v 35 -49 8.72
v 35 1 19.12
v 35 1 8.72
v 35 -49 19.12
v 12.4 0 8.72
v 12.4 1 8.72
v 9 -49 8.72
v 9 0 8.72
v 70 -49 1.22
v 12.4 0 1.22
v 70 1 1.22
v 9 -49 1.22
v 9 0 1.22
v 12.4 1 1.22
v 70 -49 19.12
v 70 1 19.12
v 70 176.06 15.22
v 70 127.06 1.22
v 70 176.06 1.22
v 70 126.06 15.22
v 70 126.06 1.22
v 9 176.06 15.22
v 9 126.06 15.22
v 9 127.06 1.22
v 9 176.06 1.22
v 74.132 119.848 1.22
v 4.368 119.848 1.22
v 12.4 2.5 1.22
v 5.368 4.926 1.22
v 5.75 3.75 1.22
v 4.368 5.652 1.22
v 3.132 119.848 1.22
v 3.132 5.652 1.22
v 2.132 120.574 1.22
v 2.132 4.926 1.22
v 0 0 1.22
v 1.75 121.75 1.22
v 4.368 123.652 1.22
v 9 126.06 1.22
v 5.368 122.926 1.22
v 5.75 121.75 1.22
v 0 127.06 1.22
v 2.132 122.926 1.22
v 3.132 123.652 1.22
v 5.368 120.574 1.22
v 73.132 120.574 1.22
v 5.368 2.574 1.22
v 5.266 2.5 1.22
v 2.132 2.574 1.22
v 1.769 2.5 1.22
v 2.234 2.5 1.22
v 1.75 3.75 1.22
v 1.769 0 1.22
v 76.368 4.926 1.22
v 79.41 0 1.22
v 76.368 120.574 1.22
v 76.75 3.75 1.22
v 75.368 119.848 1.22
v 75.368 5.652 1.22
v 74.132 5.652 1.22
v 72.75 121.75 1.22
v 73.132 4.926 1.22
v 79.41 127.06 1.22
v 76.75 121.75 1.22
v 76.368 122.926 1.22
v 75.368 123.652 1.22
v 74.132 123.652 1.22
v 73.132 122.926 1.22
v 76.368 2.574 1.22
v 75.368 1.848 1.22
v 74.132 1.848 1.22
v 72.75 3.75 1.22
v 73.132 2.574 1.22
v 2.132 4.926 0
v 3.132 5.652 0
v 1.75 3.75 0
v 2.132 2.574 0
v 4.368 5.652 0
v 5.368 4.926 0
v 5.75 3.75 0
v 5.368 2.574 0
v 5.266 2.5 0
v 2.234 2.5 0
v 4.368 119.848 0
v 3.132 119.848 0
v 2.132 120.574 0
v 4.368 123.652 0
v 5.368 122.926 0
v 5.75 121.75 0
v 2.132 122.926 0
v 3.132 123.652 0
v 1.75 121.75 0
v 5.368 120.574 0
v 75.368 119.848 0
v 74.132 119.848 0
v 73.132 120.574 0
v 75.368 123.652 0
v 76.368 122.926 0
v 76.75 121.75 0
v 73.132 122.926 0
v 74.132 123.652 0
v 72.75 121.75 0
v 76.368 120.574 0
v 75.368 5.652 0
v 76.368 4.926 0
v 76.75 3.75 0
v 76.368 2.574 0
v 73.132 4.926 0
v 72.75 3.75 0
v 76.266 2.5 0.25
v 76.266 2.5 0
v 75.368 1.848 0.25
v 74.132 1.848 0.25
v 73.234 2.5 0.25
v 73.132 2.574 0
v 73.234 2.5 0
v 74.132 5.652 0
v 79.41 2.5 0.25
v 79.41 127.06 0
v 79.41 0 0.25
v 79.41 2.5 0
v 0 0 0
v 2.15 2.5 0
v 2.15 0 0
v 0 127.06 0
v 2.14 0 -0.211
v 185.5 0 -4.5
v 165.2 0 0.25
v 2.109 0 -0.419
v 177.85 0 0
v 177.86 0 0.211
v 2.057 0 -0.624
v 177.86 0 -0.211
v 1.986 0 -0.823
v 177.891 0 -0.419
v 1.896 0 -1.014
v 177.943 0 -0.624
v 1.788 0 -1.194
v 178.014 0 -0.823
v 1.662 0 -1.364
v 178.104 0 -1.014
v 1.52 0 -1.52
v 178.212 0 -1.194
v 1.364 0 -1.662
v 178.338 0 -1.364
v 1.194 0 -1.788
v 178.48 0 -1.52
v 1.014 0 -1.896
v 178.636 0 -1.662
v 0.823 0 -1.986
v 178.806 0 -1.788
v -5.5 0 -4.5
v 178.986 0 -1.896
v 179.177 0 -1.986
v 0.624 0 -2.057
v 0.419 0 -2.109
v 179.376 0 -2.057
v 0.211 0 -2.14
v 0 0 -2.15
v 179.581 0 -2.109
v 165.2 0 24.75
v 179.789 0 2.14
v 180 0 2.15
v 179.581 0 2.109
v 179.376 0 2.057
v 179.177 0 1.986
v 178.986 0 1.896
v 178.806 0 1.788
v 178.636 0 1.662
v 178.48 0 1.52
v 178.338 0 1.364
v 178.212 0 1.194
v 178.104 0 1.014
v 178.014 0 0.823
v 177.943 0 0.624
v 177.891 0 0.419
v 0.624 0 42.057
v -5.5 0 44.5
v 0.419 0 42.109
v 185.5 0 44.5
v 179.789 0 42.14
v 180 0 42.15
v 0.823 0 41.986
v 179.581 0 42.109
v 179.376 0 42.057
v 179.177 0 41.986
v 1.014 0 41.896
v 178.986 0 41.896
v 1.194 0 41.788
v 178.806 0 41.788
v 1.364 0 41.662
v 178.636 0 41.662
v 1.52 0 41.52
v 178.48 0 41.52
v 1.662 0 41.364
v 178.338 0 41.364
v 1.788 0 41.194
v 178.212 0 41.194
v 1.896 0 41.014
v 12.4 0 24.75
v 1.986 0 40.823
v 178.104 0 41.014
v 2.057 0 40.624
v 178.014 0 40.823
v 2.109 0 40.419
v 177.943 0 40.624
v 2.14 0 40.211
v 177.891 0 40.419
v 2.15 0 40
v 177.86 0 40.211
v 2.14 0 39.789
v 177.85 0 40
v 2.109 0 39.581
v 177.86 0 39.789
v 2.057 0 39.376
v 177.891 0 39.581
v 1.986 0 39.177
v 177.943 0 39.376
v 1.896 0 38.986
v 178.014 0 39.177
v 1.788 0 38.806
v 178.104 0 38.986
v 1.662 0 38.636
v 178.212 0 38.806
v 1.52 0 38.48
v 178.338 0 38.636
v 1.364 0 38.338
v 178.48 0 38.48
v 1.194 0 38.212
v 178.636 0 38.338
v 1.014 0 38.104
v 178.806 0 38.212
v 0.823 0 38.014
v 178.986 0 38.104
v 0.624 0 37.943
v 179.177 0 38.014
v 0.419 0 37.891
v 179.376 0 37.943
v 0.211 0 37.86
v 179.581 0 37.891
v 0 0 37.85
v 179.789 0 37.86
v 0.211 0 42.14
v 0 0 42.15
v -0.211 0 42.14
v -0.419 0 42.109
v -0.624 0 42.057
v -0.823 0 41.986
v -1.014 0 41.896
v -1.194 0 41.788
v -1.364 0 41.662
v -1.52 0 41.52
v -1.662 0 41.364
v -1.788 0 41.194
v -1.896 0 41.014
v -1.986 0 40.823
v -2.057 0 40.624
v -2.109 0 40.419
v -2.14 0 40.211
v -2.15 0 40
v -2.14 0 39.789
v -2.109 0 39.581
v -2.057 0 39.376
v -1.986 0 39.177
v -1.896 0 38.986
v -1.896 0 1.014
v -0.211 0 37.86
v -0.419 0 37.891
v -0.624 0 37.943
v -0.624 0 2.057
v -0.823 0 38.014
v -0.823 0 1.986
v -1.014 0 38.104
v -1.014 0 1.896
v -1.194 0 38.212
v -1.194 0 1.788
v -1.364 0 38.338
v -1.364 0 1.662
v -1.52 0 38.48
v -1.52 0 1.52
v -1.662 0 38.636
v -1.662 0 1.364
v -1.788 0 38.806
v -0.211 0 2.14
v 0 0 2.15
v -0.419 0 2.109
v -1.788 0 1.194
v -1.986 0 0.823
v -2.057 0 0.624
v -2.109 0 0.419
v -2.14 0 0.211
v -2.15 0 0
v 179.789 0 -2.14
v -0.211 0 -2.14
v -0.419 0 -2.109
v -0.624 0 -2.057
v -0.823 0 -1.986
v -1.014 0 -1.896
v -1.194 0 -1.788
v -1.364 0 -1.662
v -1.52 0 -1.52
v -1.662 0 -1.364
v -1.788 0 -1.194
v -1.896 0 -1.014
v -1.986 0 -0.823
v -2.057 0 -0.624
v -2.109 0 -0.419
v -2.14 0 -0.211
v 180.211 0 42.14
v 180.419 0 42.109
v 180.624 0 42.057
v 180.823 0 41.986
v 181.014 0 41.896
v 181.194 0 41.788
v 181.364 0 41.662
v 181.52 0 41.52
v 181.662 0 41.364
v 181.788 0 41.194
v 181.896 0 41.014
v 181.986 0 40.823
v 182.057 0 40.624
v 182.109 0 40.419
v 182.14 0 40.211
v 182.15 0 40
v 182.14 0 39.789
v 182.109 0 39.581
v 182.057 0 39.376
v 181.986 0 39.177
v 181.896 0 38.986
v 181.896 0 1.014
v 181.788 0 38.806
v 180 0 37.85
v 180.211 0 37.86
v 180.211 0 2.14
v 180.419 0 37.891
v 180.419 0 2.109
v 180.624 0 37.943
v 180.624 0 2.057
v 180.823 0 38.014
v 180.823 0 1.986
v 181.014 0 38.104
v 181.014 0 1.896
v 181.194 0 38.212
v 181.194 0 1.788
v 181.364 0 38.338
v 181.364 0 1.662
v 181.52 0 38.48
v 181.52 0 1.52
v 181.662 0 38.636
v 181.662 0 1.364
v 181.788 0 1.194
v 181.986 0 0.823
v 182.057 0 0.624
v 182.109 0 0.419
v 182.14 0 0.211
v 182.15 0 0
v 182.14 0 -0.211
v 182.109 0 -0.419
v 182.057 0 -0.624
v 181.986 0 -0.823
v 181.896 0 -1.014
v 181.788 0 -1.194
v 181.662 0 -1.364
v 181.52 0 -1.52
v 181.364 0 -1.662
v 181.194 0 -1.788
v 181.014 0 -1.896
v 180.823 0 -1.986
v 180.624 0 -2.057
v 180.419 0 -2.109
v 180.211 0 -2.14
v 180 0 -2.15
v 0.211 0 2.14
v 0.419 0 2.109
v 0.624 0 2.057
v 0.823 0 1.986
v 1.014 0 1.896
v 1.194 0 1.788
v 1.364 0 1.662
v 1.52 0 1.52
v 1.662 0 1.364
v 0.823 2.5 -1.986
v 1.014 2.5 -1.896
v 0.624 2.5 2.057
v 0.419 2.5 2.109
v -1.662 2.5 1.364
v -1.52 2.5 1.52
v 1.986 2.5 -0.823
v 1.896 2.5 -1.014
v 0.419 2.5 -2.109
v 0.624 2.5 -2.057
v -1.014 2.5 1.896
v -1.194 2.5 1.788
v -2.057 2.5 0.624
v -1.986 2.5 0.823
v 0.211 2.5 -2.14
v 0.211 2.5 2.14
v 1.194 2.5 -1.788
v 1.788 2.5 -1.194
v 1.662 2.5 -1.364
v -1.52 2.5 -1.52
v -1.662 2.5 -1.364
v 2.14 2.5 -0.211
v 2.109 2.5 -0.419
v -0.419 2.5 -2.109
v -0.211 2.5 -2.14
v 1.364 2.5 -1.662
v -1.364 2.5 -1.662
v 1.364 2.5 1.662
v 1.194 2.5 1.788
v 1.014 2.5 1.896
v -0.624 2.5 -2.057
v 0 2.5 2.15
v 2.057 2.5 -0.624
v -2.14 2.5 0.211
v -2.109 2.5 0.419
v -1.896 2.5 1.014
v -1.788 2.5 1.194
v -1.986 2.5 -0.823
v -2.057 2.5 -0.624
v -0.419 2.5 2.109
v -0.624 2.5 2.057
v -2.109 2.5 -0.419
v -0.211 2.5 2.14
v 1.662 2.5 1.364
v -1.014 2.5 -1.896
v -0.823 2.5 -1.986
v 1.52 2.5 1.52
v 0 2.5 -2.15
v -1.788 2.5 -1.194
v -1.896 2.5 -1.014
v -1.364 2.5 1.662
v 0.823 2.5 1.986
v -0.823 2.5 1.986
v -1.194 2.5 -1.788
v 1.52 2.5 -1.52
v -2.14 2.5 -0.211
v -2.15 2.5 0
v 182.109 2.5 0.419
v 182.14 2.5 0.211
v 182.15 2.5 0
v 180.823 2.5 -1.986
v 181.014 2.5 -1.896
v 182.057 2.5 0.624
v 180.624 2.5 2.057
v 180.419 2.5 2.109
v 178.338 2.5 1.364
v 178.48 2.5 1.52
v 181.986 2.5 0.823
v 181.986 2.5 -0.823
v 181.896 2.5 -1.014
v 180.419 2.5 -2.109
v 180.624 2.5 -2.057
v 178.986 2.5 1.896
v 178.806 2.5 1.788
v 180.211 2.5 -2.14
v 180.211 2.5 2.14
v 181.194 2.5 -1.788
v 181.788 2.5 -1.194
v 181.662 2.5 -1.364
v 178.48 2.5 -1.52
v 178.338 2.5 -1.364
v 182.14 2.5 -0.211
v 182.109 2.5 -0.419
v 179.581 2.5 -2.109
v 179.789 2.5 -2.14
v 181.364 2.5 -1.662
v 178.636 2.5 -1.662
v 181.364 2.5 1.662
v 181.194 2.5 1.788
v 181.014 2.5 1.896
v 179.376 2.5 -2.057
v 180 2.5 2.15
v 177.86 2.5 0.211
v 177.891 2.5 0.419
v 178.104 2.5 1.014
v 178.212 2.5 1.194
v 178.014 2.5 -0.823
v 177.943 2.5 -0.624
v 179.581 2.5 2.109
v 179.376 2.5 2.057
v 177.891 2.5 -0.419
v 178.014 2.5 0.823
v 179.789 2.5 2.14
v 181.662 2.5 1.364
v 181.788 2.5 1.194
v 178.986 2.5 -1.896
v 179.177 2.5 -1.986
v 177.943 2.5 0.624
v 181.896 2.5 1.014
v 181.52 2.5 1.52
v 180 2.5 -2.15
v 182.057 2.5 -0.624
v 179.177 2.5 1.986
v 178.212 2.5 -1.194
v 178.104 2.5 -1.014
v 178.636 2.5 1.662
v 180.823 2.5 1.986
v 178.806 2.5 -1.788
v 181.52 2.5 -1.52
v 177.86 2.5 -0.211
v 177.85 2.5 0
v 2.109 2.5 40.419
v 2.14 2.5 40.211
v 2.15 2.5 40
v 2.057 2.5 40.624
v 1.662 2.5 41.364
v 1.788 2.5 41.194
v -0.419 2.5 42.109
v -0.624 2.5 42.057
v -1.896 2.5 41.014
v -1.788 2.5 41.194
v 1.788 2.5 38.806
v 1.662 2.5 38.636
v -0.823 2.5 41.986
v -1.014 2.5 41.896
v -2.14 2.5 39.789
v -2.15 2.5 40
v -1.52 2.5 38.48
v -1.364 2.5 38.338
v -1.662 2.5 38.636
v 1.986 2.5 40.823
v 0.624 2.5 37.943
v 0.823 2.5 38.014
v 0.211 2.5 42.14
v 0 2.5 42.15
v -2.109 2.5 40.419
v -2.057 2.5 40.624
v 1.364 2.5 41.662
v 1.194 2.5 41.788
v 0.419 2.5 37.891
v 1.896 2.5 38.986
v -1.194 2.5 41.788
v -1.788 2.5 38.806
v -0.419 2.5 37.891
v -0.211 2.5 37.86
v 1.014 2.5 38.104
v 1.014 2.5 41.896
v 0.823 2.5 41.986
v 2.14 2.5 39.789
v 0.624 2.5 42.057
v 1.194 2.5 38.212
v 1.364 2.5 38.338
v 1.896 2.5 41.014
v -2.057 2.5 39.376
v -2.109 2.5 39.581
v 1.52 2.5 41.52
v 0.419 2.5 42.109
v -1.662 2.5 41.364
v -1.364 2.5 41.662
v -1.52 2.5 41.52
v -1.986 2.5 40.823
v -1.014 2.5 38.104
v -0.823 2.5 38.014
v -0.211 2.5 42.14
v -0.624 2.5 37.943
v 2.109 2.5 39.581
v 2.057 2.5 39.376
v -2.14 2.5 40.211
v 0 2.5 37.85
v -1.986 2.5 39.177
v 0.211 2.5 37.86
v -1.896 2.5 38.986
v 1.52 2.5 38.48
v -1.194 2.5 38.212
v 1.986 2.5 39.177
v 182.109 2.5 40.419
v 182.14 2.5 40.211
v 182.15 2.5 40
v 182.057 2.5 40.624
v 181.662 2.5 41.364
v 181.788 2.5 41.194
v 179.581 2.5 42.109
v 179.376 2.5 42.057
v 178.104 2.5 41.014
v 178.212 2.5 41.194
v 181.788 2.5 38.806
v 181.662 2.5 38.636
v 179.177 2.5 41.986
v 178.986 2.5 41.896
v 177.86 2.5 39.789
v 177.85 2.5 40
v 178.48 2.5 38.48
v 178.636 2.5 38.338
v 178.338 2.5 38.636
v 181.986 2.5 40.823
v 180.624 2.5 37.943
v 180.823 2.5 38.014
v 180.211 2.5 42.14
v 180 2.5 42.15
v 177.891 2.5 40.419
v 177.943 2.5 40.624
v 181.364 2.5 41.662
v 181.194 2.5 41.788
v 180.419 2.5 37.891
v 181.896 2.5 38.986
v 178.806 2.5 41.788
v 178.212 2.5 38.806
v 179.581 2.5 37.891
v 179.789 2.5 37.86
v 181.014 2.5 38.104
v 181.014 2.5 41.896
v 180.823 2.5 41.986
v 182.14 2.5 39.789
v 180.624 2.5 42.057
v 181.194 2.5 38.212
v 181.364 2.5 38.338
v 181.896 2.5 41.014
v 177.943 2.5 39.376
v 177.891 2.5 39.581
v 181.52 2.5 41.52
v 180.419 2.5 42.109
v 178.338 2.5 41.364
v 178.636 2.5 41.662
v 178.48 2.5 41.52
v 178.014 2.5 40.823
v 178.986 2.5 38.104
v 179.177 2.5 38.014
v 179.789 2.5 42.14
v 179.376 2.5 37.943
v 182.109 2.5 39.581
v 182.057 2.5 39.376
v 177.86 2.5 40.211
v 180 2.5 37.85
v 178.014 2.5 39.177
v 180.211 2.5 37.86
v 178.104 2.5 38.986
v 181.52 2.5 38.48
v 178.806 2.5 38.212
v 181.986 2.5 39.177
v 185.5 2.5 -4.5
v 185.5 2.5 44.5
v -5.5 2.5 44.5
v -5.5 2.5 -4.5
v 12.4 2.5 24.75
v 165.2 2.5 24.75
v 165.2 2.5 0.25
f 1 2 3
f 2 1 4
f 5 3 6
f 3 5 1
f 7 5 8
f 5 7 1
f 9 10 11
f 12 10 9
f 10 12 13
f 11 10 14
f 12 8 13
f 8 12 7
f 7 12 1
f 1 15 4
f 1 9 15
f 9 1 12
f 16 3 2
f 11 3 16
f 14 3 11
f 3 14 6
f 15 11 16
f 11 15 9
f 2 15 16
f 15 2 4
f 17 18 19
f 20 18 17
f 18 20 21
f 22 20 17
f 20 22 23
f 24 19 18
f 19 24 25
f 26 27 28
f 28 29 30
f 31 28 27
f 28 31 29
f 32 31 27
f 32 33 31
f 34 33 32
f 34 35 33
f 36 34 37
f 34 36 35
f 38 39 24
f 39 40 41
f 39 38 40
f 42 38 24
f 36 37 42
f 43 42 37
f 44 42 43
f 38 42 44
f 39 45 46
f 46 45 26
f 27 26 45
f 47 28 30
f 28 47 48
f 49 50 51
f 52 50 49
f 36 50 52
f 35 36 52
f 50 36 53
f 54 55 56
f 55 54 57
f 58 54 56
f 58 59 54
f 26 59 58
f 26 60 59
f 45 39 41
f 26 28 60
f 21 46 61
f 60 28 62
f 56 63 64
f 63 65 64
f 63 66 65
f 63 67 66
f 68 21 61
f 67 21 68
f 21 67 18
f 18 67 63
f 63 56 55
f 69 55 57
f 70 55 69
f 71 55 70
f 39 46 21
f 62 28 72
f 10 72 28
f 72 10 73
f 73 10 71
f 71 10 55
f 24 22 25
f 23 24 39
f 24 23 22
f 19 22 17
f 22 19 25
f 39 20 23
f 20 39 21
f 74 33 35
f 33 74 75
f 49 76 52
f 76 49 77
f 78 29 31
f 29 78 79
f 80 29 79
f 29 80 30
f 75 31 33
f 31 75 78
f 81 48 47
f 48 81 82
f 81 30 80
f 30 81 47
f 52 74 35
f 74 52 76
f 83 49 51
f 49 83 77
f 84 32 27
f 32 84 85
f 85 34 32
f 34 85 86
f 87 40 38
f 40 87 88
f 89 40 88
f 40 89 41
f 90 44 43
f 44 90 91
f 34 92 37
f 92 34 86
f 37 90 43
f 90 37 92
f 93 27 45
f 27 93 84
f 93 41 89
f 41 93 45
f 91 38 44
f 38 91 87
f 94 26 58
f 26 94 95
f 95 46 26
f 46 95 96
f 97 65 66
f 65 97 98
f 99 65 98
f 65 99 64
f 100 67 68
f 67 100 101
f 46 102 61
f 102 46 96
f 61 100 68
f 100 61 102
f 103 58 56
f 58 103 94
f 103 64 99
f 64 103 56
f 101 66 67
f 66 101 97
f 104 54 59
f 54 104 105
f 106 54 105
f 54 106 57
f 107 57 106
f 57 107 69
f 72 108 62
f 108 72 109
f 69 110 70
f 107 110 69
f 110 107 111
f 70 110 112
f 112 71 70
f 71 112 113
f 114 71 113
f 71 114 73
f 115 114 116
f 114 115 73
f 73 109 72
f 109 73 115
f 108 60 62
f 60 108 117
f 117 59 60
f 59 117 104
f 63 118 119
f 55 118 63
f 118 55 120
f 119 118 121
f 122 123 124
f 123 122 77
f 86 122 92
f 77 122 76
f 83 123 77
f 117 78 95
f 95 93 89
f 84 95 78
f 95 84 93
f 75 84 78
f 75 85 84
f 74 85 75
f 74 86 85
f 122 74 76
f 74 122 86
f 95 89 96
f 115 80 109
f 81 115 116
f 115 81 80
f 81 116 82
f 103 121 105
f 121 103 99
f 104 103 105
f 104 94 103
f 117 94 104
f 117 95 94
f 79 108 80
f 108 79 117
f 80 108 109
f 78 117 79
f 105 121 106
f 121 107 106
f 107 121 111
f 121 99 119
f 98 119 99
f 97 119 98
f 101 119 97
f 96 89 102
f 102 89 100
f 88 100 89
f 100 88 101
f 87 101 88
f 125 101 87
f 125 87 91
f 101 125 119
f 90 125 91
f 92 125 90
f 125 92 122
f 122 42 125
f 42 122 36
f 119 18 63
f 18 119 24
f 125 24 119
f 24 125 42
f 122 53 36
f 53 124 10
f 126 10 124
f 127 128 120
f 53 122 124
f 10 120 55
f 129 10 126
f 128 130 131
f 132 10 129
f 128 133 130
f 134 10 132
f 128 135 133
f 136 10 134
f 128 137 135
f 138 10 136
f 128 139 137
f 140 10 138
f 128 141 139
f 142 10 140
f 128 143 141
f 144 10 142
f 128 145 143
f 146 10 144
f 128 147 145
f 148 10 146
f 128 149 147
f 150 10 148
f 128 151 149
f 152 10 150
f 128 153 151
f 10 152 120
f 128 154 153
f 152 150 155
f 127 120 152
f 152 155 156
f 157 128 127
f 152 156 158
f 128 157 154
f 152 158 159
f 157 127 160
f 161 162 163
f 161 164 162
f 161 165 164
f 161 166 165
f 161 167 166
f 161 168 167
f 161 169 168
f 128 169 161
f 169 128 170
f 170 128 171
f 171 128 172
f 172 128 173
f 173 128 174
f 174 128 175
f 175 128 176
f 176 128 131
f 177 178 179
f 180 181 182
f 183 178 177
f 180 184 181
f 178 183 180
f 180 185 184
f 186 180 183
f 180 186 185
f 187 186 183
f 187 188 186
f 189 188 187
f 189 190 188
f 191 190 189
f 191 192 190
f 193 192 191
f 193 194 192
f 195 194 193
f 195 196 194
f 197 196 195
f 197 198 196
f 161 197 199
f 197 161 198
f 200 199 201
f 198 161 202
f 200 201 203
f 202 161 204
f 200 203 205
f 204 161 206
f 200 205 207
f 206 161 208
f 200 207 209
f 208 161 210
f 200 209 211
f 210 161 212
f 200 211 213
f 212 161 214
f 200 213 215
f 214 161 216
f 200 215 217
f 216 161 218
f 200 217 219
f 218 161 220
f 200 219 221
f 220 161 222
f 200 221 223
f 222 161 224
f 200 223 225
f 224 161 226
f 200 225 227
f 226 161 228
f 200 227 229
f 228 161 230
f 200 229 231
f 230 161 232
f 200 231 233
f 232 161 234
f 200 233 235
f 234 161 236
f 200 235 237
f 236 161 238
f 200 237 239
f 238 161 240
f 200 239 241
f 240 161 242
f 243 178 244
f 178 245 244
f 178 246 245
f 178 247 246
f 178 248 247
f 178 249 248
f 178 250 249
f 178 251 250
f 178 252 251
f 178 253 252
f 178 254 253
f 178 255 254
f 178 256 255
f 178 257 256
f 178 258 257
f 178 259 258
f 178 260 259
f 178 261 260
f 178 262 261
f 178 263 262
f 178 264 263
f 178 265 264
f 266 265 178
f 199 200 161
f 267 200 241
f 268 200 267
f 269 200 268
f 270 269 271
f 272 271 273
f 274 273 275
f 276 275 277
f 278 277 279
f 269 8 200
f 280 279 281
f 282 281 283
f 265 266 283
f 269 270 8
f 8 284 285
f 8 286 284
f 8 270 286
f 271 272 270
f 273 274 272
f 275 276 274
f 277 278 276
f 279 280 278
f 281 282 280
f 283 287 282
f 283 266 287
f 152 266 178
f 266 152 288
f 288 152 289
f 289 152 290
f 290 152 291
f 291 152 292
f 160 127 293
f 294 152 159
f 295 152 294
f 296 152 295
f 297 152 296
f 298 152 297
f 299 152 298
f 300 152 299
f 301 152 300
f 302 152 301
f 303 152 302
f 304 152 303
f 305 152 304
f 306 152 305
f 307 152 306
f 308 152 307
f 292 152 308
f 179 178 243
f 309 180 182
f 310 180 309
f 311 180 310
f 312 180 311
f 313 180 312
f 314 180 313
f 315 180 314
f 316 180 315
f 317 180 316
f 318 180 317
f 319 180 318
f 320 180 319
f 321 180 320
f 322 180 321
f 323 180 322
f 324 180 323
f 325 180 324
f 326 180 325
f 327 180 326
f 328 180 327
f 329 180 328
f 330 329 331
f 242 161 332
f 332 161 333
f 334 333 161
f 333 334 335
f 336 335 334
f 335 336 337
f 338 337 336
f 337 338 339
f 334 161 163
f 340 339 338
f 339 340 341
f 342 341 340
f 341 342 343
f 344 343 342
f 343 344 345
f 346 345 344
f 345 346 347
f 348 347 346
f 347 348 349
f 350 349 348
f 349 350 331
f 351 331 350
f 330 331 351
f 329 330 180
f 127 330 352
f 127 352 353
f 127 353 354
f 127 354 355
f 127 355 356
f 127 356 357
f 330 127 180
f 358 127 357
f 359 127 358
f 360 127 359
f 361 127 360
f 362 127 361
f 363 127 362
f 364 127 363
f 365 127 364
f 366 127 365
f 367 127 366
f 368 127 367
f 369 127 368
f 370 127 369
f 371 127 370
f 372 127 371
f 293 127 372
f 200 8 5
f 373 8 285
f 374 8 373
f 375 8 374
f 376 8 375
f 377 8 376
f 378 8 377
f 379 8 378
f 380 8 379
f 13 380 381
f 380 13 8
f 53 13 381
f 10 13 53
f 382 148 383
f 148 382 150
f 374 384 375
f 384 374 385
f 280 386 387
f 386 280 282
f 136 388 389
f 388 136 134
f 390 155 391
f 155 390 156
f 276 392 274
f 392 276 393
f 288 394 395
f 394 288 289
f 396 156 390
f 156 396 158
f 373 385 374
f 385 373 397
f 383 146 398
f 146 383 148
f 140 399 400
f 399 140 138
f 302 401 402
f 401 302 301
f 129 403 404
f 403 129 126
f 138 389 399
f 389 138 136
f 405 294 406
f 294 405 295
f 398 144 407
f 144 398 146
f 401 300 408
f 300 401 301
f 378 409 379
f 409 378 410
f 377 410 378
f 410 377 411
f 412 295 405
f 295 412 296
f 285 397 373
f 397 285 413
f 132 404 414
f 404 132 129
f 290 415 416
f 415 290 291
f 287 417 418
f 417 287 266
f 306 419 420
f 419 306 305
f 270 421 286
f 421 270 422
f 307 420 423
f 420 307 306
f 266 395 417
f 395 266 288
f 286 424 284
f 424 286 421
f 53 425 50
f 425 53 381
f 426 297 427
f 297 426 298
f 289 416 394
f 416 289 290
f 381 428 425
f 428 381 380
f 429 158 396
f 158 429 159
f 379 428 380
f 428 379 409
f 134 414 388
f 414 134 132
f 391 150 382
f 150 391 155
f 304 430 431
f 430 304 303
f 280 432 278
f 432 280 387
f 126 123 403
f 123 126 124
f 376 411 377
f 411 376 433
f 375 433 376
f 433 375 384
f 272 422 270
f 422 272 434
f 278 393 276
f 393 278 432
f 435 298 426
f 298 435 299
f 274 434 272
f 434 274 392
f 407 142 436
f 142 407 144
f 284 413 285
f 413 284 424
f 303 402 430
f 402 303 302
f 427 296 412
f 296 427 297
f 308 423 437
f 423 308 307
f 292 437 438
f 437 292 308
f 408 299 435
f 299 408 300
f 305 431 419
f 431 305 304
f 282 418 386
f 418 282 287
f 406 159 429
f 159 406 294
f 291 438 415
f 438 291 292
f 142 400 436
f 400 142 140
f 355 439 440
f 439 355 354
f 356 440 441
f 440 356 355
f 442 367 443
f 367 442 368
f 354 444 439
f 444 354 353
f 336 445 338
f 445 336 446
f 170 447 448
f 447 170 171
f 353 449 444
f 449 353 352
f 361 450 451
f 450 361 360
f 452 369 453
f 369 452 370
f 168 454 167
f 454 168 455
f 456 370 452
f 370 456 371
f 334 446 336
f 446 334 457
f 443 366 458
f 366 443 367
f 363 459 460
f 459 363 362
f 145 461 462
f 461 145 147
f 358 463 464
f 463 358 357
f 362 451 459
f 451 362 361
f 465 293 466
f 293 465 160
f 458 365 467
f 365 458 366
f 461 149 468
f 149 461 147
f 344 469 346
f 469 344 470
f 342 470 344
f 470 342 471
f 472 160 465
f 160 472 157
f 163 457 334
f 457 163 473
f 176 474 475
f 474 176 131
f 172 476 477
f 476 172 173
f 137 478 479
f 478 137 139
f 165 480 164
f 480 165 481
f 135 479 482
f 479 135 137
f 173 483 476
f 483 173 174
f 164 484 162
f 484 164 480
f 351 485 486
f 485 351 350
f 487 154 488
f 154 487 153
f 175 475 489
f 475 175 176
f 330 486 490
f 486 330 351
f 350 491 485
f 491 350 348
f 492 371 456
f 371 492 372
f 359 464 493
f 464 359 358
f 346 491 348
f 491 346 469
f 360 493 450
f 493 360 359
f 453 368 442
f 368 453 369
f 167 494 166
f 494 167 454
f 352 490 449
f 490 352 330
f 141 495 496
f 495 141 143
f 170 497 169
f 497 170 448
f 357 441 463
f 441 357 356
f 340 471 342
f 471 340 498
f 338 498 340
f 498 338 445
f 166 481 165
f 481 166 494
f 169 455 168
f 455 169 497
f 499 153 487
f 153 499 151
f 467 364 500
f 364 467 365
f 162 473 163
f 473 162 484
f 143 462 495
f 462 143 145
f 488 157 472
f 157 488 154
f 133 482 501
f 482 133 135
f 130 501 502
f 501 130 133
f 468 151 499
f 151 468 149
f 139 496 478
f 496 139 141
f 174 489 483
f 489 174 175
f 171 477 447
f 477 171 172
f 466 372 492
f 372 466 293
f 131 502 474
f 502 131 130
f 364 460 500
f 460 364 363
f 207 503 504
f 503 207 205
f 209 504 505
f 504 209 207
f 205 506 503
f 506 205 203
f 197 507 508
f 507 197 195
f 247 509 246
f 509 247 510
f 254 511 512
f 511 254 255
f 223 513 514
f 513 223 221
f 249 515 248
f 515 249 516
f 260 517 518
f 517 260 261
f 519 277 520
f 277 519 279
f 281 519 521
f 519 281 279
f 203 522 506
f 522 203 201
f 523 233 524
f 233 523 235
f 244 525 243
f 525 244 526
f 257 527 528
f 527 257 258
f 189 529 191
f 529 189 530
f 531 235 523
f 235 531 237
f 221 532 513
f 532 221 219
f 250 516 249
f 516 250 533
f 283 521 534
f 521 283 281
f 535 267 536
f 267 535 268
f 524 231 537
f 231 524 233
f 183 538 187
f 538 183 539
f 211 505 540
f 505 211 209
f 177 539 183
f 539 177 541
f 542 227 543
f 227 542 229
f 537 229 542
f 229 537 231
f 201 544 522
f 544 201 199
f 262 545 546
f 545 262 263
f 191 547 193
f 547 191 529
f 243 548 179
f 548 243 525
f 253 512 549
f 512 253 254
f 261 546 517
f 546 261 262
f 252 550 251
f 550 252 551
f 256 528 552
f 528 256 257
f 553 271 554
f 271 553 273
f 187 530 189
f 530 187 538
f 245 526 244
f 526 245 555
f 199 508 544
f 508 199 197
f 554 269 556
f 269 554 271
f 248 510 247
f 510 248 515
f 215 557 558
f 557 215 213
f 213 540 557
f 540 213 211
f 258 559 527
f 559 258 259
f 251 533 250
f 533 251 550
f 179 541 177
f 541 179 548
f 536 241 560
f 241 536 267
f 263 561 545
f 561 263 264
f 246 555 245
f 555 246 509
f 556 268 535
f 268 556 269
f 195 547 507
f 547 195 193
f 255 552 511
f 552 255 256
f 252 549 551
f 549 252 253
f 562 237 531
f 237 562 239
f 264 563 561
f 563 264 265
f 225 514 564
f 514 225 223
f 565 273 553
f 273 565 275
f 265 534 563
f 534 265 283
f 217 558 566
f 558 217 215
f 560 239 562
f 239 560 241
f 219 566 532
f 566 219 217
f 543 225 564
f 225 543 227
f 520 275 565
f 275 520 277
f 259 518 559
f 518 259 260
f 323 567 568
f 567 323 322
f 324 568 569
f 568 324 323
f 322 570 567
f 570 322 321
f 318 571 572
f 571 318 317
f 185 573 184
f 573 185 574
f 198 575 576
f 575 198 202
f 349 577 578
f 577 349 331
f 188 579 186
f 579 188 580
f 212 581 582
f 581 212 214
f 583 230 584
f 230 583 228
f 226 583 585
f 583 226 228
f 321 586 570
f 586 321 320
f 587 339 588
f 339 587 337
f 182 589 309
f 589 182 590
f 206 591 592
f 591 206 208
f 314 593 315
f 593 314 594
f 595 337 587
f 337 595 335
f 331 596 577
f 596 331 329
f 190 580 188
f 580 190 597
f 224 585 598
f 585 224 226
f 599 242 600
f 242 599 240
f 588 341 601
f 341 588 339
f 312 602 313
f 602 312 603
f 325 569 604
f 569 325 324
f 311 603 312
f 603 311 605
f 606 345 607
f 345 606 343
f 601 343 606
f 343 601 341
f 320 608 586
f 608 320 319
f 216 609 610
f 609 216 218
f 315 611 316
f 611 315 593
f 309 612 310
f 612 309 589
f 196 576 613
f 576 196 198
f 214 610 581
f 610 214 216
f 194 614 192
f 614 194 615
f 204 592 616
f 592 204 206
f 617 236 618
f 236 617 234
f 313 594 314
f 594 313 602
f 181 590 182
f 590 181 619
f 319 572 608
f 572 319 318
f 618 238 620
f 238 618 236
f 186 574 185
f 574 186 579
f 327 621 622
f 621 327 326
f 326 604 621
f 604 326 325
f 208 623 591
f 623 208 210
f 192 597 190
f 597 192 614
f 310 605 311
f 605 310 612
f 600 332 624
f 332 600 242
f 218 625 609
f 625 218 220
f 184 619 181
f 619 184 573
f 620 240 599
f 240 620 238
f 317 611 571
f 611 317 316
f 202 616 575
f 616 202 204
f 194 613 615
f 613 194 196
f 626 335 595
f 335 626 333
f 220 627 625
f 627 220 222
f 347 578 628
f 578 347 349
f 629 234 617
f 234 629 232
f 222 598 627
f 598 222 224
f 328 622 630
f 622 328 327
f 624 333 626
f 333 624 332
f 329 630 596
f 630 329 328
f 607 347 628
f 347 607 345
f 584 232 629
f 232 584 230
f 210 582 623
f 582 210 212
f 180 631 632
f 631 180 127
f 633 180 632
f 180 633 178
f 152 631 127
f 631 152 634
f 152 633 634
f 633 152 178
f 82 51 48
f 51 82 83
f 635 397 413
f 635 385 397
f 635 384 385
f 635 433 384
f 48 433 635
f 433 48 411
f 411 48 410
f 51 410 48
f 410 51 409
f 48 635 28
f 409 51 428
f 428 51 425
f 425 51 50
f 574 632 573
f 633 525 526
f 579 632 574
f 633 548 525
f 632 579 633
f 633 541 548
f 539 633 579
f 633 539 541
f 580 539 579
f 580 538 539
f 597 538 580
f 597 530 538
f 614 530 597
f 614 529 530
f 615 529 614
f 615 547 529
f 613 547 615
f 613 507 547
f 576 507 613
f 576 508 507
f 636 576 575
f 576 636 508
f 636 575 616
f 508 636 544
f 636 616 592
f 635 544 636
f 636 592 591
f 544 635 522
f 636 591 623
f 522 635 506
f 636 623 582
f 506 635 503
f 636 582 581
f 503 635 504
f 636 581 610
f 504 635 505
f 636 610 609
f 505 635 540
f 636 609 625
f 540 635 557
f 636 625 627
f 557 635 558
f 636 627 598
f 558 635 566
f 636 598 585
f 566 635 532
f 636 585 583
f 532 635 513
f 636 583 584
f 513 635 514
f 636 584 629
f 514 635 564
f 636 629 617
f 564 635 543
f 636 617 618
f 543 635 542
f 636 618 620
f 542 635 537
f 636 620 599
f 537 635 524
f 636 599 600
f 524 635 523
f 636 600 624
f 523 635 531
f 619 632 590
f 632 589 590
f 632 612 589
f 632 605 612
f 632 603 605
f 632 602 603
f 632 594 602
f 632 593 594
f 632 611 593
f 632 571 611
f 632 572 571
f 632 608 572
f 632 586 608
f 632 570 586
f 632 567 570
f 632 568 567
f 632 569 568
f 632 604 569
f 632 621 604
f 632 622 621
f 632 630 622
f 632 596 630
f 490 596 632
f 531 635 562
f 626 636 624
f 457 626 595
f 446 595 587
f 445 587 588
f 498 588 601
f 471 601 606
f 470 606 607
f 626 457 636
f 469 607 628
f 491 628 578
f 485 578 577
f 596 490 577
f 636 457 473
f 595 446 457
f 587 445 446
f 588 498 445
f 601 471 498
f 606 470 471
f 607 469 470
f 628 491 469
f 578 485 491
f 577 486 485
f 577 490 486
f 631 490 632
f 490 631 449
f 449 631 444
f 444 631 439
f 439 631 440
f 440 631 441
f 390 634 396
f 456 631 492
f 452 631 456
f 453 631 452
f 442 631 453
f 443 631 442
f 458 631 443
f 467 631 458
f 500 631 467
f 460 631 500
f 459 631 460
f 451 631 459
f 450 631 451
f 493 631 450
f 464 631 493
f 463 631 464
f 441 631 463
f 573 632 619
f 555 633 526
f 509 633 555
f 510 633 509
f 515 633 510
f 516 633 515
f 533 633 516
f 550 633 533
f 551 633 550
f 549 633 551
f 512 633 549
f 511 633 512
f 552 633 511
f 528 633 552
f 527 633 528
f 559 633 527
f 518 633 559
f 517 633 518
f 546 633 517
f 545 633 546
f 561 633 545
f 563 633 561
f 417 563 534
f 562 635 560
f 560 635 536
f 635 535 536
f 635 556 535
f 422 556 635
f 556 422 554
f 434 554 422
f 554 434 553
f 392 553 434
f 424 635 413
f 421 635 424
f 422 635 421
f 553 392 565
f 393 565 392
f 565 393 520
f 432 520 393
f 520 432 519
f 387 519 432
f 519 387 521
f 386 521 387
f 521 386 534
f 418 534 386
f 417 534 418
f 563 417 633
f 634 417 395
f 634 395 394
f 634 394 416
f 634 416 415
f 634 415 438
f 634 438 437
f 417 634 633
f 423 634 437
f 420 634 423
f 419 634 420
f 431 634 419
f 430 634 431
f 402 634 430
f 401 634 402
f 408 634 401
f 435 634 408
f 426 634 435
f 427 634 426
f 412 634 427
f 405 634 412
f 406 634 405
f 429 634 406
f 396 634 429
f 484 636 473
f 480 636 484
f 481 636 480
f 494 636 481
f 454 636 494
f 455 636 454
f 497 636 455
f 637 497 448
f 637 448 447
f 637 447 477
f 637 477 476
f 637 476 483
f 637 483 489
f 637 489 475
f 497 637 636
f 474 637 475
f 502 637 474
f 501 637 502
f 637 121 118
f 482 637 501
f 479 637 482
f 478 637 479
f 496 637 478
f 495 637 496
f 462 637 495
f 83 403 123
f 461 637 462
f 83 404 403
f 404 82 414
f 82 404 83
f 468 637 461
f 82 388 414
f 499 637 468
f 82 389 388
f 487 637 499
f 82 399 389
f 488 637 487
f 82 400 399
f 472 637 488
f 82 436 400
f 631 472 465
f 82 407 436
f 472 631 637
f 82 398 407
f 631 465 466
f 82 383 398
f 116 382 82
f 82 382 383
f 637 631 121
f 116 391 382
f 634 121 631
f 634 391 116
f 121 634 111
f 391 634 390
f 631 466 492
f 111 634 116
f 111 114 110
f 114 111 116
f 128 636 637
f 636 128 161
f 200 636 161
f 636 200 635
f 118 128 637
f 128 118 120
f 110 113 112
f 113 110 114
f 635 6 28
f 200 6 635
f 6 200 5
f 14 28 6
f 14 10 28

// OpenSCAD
// file: ../rockpro/rockpro.scad
include <../common.scad>

// All coordinates are in [x,y], or [x,y,z] format

pcbDimensions = [79.41, 127.06]; // [x,y]
pcbThickness = 1.22;

// TODO move mount points
mountPoints = [[0,0,0], [0,118,0], [71.0,118, 0], [71.0,0,0]];

module mountPoints_N(cylHeight, cylRad1, cylRad2, cylFn, center) {
  for (i=[0:3]) {
    p = mountPoints[i];
    translate(v=[p[0], p[1], p[2]])
    cylinder(r1=cylRad1, r2=cylRad2, h=cylHeight, $fn=cylFn, center=center);
  }
  
}

module pcb() {
  cube(size=[pcbDimensions[0], pcbDimensions[1], pcbThickness]);
}

// defined on x-z plane, start at top of pcb
module frontFaceIOCutouts_N() {
  translate(v=[9,0,0])
    cube(size=[26.0,inf50,7.5]);

  translate(v=[35,0,0])
    cube(size=[35,inf50,17.9]);
}
module backFaceIOCutouts_N() {
  translate(v=[9,0,0])
    cube(size=[61,inf50,14]);
}


module cutoutProfile_N() {

  color([1,0,1])
  union() {
  mirror(v=[0,1,0])
    translate(v=[0,-1,pcbThickness])
    frontFaceIOCutouts_N();

  translate(v=[0,pcbDimensions[1]-1, pcbThickness])
  backFaceIOCutouts_N();
  }

  color([0.3,0.8,0.1])
  difference() {
    pcb();
    translate(v=[3.75, 3.75])
      mountPoints_N(10,2,2,10,true);
  }
}

cutoutProfile_N();


//mountPoints_N(10,2,2, true);
// file: screws.scad
/* Some common screw dimensions */


inf = 400; // basically infinity

/********************************************************************************/
// M3 dimensions

m3HoleRadiusSlack = 0.15;
m3Diameter = 3.0;
m3Radius = m3Diameter/2.0;

m3RadiusSlacked = m3Radius + m3HoleRadiusSlack;

// legacy TODO: replace
m3ptr = m3RadiusSlacked;

// NUTS!
m3HexNutWidthAcrossFlats = 5.41;
m3HexNutWidthAcrossCorners = FtoG(m3HexNutWidthAcrossFlats);

m3HexNutThickness = 2.18;

module m3HexNutPocketNegative() {
  hexNutPocketNegative(m3RadiusSlacked,
                       m3HexNutWidthAcrossCorners/2 + 0.1,
                       m3HexNutThickness + 0.2);
}


// TODO: remove test

*difference() {
  cube(size=[8,12,5], center=true);

  rotate(a=[0,0,20])
  m3HexNutPocketNegative();
}

*m3HexNutPocketNegative();


/********************************************************************************/
// M4 dimensions

m4HoleRadiusSlack = 0.15;
m4Diameter = 4.0;
m4Radius = m4Diameter/2.0;
m4RadiusSlacked = m4Radius + m4HoleRadiusSlack;

m4HexNutWidthAcrossFlats = 6.89;
m4HexNutWidthAcrossCorners = FtoG(m4HexNutWidthAcrossFlats);

m4HexNutThickness = 3.07;

module m4HexNutPocketNegative() {
  hexNutPocketNegative(m4RadiusSlacked,
                       m4HexNutWidthAcrossCorners/2 + 0.1,
                       m4HexNutThickness + 0.2);
}


// TODO: remove test

*difference() {
  translate(v=[0,1,0])
  cube(size=[10,12,6], center=true);

  rotate(a=[0,0,20])
  m4HexNutPocketNegative();
}

*m4HexNutPocketNegative();

/********************************************************************************/

// Convert a regular hexagon widthAcrossFlats to widthAcrossCorners
function FtoG(widthAcrossFlats) = widthAcrossFlats * (2/sqrt(3));  

// Convert a regular hexagon widthAcrossCorners to widthAcrossFlats
function GtoF(widthAcrossCorners) =  widthAcrossCorners * (sqrt(3)/2);


module hexNutPocketNegative(
  innerRadius,
  widthAcrossCorners,
  thickness)
{

  union() {

    hull() {
      // hexagonal cylinder representing where the nut should fit
      cylinder(r=widthAcrossCorners, h=thickness, center=true, $fn=6);

      // negative volume for sliding in the nut
      translate(v=[inf,0,0])
      cylinder(r=widthAcrossCorners, h=thickness, center=true, $fn=6);
    }

    // negative volume for screw lead
    translate(v=[0,0,-10])
    cylinder(r=innerRadius, h = inf, $fn=32);

    hull() {
     translate(v=[inf,0,0])
       cylinder(r=innerRadius, h = inf, $fn=32);
     cylinder(r=innerRadius, h = inf, $fn=32);
    }
  }
}
// file: ../common.scad
/* Some initial configurations and commonly used variables
   plus functions
*/

$fn=64;


eps=0.01;

inf10 = 10;
inf50 = 50;
inf1000 = 1000;
inf = inf1000;
// main file
include <../common.scad>
include <./screws.scad>
include <../rockpro/rockpro.scad>

vU = 4;
uHeight = 10;

plateScrewDiffV = uHeight*vU;
plateScrewDiffH = 180;

plateScrewToHEdge = 4.5;
plateScrewToVEdge = 5.5;

frontPlateThickness = 2.5;

frontPlateV = plateScrewDiffV + 2*plateScrewToHEdge;
frontPlateH = plateScrewDiffH + 2*plateScrewToVEdge;


plateScrewToBoxMin = 6;

// BOX CONFIG

// box dimensions
boxDepth = 135;
boxWidth = 95;

boxBottomThickness = 1;
boxSideThickness = 2;
boxBackThickness = 2;
// boxFrontThickness is just frontPlateThickness



boxTopSpace = 1; // meant for lids?
boxBottomSpace = 1; // meant to be used for boxes that expect support rails


boxHeight = vU * uHeight + 2*plateScrewToHEdge - (boxBottomSpace+boxTopSpace);



// all of these are defined on the xy plane with centered zLen height
// 'rise' is meant model how raised a pcb is. More specifically, the distance between the top of
// the pcb and the bottom of the inside of the case
module frontFaceHoles(zLen, rise) {

  //mirror(v=[0,1,0])
//    translate(v=[5,-eps,rise])
  //frontFaceIOCutouts_N();
}

module backFaceHoles(zLen, rise) {
}

module leftFaceHoles(zLen, rise) {
}

module rightFaceHoles(zLen, rise) {
}




module boxBody() {
  // save this transformation...
  // translate(v=[(plateScrewDiffH-boxWidth)/2.0,0,boxBottomSpace -plateScrewToHEdge])

  // convert to inside box space
  translate(v=[-boxSideThickness, -frontPlateThickness, -boxBottomThickness])
  difference() {
    cube(size=[boxWidth, boxDepth, boxHeight]);
    translate(v=[boxSideThickness, frontPlateThickness, boxBottomThickness])
      cube(size=[boxWidth-2*boxSideThickness, boxDepth-(boxBackThickness+frontPlateThickness), inf]);
  }

  
}


*difference() {
  boxBody();

  translate(v=[7,2,5])
    cutoutProfile_N();
}

translate(v=[7,2,5])
*cutoutProfile_N();




module _frontPlateBody() {
  translate(v=[-plateScrewToVEdge,0,-plateScrewToHEdge])
    cube(size=[frontPlateH,frontPlateThickness,frontPlateV]);
}

module _plateHole() {
  rotate(a=[90,0,0])
  cylinder(r=m4RadiusSlacked, h=inf, center=true);
}


module frontPlate() {

  difference() {
    _frontPlateBody();

    union() {
      // TODO: introduce helper modules for this pattern
      _plateHole();

      translate(v=[plateScrewDiffH,0,0])
        _plateHole();

      translate(v=[0,0,plateScrewDiffV])
        _plateHole();

      translate(v=[plateScrewDiffH,0,plateScrewDiffV])
        _plateHole();
    }

    // TODO REMOVE. Used to save on filament and print time
    scale(v=[0.8, 1+eps, 0.5])
      translate(v=[0,-eps,0])
      translate(v=[21,0,5])
      _frontPlateBody();
  }
}


frontPlate();
